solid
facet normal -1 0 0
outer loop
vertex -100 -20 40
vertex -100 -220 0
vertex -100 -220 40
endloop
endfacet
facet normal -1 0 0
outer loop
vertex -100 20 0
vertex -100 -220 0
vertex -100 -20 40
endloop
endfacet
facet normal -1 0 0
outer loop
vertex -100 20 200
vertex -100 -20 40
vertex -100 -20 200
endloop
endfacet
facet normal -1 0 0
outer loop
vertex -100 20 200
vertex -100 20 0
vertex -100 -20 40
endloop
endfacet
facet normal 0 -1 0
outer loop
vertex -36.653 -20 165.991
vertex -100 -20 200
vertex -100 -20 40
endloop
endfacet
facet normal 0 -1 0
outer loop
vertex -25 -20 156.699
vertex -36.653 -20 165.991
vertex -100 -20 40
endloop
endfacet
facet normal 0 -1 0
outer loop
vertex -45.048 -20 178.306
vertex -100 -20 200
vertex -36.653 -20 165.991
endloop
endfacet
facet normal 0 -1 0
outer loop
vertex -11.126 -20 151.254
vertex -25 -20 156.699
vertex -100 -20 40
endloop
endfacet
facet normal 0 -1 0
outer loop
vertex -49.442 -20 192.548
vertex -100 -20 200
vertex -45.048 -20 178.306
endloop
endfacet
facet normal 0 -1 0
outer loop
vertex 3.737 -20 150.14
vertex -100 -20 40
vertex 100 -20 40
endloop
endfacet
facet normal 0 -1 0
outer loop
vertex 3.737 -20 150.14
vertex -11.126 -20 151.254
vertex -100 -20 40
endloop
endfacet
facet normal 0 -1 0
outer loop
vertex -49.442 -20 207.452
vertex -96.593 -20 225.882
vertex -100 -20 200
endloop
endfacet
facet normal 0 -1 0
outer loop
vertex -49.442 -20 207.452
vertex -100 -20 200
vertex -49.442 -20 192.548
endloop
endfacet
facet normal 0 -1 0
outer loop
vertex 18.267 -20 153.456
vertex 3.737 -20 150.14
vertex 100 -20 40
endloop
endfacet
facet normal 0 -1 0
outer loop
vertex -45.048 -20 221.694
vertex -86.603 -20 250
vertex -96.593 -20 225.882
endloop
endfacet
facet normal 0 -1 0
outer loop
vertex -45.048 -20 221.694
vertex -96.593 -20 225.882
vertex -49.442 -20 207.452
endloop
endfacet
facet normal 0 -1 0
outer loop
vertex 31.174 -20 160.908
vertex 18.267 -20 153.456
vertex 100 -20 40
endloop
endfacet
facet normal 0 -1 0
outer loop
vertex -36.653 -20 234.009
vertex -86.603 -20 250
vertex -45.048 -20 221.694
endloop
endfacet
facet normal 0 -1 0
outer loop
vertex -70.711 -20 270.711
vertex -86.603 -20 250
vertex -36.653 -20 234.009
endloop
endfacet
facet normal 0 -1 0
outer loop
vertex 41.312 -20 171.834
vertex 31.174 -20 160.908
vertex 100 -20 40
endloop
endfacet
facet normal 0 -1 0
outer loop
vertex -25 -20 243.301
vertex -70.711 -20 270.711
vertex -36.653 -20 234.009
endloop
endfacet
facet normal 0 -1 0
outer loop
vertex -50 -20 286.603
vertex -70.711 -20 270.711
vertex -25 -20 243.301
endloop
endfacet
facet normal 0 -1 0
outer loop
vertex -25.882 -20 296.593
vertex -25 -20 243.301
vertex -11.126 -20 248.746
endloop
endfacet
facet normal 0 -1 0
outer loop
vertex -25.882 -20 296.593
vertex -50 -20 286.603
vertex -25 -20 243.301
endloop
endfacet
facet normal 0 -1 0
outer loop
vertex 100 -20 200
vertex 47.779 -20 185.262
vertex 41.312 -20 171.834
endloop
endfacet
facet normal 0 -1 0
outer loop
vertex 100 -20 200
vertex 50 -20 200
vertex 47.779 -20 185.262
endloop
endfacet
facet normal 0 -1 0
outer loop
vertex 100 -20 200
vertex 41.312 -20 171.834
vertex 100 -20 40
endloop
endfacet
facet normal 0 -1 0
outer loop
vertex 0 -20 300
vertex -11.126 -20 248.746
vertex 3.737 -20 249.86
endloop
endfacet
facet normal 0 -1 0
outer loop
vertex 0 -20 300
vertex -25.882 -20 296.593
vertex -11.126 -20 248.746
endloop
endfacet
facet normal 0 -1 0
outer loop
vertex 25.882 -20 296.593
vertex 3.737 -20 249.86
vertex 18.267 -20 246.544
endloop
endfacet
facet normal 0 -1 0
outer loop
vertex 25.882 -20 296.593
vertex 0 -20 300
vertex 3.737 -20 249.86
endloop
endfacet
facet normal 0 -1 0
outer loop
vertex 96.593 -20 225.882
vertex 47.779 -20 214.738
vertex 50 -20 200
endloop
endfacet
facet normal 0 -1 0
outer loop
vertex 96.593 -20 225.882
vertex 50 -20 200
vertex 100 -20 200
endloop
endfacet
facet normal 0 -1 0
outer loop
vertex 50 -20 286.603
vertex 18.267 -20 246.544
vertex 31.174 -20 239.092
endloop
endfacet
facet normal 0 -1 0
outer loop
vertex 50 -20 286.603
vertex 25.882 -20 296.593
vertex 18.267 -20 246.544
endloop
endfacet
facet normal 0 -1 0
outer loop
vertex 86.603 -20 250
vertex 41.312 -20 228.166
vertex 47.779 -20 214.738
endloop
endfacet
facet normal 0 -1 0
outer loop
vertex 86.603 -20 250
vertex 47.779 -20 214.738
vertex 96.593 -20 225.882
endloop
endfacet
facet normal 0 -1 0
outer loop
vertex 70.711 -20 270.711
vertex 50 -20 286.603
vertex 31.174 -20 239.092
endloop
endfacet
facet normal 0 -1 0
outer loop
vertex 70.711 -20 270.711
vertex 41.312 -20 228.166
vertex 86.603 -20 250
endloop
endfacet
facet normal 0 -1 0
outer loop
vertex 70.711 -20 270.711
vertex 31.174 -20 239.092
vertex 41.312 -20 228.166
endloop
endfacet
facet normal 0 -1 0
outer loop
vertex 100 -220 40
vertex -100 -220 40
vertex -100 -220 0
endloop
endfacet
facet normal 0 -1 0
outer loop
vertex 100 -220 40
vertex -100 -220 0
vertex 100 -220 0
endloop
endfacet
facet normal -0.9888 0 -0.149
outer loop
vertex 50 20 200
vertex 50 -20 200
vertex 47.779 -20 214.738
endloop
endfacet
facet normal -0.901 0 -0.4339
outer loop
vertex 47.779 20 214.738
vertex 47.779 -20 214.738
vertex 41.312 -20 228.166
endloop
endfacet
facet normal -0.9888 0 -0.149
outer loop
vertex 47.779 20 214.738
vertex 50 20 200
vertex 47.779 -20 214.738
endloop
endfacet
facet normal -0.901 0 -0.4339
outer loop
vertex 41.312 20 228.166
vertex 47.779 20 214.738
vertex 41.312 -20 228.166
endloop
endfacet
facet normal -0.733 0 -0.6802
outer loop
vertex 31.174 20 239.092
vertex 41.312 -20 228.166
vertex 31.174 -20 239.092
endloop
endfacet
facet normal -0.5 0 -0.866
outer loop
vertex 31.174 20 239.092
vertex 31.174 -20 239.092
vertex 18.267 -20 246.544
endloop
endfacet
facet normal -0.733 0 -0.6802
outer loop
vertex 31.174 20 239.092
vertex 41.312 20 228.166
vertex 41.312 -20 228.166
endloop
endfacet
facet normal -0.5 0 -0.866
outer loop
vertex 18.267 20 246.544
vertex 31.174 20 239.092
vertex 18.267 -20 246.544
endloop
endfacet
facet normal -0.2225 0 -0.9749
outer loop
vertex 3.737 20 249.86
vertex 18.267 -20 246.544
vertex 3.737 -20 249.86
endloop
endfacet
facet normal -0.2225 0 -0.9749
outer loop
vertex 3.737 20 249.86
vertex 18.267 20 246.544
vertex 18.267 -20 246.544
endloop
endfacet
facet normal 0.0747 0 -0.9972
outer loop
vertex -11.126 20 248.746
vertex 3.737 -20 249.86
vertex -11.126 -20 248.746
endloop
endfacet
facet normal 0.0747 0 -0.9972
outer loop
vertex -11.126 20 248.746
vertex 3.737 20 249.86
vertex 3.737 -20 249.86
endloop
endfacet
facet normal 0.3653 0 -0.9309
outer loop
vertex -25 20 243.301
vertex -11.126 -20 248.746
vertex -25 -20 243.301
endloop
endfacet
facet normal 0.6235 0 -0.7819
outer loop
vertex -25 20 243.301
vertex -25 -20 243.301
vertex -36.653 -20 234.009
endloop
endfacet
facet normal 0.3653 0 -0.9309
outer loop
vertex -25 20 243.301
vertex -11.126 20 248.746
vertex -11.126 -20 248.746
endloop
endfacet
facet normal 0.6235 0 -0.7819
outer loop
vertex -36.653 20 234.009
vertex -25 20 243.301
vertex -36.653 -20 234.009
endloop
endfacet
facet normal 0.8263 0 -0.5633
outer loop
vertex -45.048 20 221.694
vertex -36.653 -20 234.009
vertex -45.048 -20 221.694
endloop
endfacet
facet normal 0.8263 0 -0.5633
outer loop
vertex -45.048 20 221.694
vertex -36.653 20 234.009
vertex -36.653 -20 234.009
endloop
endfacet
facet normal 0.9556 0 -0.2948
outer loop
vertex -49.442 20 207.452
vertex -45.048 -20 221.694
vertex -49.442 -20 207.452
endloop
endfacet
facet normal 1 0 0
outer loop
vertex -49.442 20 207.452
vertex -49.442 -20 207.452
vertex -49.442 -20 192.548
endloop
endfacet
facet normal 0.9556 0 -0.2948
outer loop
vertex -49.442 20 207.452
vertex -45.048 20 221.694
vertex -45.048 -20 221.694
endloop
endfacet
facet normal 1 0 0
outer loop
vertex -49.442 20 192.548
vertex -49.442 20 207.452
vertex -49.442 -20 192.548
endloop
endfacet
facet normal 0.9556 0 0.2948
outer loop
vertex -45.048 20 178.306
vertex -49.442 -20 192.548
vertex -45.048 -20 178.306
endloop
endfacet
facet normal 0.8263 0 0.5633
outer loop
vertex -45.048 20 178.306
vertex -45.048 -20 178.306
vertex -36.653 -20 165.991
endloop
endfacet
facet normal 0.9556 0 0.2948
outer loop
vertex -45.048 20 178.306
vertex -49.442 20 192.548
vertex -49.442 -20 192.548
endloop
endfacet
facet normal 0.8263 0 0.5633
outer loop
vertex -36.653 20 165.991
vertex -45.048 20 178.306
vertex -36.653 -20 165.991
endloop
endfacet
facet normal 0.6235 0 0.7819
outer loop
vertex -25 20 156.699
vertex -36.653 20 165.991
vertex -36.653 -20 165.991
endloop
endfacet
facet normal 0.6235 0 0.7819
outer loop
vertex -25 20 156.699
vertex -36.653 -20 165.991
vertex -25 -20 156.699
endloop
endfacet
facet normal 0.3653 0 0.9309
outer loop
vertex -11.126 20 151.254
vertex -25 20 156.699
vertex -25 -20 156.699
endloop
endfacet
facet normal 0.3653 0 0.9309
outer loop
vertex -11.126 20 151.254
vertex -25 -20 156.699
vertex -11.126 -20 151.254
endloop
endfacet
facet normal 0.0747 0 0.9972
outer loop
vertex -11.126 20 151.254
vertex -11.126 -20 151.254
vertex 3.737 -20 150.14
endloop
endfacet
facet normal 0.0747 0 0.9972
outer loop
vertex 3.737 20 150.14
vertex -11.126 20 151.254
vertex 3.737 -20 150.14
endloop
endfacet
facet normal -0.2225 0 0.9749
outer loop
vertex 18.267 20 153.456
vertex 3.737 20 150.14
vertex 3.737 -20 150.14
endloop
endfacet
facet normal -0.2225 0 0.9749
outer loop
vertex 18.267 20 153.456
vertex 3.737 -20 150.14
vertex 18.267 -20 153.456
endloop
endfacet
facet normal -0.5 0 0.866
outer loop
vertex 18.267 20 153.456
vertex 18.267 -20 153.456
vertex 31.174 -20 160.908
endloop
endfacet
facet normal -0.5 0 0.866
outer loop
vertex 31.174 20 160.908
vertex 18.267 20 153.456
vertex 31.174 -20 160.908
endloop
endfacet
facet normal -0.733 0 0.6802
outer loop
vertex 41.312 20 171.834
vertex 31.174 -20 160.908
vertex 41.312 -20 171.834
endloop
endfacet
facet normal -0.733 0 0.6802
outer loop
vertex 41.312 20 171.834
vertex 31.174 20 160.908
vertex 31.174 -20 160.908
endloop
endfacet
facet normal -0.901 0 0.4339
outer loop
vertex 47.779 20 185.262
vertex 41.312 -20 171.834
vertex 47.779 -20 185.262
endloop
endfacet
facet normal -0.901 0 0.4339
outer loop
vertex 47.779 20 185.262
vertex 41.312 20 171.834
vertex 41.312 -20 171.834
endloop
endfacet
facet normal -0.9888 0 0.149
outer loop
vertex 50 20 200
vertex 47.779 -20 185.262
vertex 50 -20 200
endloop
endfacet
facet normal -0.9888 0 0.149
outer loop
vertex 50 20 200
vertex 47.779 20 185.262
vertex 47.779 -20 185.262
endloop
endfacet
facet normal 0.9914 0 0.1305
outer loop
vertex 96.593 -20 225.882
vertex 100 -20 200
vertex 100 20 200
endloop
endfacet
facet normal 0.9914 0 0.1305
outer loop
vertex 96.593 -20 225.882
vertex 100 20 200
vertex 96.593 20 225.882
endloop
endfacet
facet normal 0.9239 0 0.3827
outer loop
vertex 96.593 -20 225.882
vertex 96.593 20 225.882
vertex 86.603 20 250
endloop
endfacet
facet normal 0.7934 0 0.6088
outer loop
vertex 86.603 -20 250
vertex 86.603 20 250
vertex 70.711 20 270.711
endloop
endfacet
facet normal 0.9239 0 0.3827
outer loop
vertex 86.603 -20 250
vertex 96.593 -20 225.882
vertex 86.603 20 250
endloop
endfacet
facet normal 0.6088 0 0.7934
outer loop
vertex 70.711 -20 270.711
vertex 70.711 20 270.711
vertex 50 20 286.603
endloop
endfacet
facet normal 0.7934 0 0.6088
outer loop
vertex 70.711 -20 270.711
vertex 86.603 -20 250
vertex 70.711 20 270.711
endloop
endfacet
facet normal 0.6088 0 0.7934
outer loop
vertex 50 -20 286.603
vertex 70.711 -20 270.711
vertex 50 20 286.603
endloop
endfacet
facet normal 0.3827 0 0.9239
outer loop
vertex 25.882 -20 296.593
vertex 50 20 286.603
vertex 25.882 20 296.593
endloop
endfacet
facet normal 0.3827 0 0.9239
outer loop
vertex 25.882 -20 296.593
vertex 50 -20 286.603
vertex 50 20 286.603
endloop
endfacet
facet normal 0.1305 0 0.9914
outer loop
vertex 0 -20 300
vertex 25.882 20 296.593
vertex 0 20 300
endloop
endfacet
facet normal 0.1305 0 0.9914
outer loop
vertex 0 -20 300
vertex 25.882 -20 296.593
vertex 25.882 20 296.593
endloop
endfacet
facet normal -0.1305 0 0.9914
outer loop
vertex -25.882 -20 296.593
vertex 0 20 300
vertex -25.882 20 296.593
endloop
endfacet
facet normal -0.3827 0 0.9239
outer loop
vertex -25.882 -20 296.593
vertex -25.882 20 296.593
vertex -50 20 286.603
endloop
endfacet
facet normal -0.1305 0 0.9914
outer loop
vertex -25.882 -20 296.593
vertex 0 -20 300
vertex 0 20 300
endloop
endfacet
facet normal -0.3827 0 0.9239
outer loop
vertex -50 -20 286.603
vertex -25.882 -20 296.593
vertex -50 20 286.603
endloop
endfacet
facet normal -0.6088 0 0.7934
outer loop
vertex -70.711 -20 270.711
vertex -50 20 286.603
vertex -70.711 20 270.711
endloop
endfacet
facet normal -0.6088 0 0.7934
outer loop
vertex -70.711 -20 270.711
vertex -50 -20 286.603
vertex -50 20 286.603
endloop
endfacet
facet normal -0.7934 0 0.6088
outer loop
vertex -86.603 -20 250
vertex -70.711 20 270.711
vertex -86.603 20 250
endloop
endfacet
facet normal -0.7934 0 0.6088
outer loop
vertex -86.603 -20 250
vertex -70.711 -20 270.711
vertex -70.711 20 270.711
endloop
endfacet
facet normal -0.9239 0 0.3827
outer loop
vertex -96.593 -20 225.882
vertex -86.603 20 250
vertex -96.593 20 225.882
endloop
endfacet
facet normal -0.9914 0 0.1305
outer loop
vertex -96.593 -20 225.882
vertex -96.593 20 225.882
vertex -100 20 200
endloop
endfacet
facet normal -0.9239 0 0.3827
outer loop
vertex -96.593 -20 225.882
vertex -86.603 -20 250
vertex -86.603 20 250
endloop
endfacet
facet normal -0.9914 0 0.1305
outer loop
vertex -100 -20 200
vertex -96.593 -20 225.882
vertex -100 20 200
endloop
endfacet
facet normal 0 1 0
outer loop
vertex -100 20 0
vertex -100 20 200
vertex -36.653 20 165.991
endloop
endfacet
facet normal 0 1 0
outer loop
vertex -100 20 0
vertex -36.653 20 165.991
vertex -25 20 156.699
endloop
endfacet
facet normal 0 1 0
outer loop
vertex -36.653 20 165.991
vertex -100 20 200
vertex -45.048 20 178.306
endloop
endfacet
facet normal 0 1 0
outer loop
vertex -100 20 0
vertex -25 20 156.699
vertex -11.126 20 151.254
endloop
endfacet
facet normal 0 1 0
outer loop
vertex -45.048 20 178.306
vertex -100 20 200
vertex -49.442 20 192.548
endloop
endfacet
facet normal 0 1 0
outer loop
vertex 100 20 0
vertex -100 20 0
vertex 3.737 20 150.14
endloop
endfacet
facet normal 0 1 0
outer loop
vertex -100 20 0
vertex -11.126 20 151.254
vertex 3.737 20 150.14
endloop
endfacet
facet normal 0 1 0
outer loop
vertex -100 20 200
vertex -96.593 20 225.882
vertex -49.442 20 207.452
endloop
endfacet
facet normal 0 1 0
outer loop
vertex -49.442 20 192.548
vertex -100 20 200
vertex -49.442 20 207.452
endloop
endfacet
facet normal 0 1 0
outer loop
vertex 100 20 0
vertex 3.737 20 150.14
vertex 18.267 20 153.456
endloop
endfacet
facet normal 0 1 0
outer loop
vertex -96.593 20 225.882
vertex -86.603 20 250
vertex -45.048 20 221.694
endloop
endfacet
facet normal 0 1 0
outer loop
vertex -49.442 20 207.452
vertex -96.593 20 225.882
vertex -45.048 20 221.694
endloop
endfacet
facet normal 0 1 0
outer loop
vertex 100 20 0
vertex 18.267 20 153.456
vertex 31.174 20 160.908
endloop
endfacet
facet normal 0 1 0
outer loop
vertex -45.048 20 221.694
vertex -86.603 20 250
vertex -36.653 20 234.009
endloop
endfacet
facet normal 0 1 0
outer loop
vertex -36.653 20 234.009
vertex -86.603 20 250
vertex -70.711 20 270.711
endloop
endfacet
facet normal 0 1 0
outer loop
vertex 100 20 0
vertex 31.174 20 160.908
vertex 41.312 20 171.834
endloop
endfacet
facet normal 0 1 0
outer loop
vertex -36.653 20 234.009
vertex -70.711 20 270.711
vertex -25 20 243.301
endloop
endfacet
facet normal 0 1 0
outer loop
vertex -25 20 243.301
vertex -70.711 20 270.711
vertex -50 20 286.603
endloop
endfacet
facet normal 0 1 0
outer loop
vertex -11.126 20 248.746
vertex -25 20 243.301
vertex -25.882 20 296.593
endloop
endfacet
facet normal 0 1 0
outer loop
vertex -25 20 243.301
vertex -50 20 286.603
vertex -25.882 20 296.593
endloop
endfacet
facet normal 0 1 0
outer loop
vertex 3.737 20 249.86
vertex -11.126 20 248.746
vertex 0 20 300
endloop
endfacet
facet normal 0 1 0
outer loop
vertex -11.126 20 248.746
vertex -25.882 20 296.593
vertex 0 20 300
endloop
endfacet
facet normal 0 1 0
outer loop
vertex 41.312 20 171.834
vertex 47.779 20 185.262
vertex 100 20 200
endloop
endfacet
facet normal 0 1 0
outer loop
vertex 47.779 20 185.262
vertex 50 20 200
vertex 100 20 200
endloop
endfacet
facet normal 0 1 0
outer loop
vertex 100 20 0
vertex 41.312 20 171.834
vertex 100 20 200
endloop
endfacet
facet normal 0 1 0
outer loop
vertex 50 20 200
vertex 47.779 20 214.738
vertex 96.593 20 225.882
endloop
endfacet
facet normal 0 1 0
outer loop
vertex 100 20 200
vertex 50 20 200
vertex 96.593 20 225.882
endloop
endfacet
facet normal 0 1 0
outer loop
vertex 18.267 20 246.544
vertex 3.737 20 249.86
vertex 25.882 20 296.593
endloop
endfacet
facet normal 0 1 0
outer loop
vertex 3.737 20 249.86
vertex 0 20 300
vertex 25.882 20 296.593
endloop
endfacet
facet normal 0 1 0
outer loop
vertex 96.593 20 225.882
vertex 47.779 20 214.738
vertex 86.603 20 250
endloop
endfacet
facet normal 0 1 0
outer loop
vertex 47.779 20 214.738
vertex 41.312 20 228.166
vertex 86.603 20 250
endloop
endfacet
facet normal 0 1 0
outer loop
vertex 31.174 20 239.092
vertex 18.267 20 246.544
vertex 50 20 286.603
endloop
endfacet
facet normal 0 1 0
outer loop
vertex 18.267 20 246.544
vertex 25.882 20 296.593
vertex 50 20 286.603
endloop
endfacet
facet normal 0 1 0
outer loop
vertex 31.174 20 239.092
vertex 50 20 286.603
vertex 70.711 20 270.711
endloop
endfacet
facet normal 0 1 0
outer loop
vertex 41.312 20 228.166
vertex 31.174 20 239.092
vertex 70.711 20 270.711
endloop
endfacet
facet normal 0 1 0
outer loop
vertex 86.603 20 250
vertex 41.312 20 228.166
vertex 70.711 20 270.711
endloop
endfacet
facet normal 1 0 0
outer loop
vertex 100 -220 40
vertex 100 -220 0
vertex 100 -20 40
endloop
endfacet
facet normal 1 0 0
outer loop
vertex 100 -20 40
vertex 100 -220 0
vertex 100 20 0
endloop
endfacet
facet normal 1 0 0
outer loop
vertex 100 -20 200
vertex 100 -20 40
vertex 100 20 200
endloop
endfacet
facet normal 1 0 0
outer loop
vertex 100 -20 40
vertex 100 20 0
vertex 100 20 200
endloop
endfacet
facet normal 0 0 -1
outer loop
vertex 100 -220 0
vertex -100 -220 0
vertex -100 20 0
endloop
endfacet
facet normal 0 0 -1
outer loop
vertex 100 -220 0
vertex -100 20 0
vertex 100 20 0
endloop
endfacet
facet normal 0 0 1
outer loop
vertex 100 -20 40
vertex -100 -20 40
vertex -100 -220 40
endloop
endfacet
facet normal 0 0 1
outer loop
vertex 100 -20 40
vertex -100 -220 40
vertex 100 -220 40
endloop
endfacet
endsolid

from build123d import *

# Parameters (mm, degrees)
F0_W     = 200
F0_H     = 40
F0_R     = 50
F1_DEPTH = 20
F2_W     = 200
F2_H     = 40
F3_DEPTH = 200


with BuildPart() as f1:
    # F0 (on Front) → F1 (new body, symmetric)
    with BuildSketch(Plane.XZ):
        with Locations((0, 20)):
            Rectangle(F0_W, F0_H)
        with BuildLine():
            Line((-100, 200), (-100, 40))
            Line((-100, 40), (100, 40))
            Line((100, 40), (100, 200))
            ThreePointArc((100, 200), (0, 300), (-100, 200))
        make_face()
        with Locations((0, 200)):
            Circle(F0_R, mode=Mode.SUBTRACT)
    extrude(amount=F1_DEPTH, both=True)

    # F2 (on face) → F3 (join)
    with BuildSketch(Plane.XZ.offset(20)):
        with Locations((0, 20)):
            Rectangle(F2_W, F2_H)
    extrude(amount=F3_DEPTH)


solid = f1.part
